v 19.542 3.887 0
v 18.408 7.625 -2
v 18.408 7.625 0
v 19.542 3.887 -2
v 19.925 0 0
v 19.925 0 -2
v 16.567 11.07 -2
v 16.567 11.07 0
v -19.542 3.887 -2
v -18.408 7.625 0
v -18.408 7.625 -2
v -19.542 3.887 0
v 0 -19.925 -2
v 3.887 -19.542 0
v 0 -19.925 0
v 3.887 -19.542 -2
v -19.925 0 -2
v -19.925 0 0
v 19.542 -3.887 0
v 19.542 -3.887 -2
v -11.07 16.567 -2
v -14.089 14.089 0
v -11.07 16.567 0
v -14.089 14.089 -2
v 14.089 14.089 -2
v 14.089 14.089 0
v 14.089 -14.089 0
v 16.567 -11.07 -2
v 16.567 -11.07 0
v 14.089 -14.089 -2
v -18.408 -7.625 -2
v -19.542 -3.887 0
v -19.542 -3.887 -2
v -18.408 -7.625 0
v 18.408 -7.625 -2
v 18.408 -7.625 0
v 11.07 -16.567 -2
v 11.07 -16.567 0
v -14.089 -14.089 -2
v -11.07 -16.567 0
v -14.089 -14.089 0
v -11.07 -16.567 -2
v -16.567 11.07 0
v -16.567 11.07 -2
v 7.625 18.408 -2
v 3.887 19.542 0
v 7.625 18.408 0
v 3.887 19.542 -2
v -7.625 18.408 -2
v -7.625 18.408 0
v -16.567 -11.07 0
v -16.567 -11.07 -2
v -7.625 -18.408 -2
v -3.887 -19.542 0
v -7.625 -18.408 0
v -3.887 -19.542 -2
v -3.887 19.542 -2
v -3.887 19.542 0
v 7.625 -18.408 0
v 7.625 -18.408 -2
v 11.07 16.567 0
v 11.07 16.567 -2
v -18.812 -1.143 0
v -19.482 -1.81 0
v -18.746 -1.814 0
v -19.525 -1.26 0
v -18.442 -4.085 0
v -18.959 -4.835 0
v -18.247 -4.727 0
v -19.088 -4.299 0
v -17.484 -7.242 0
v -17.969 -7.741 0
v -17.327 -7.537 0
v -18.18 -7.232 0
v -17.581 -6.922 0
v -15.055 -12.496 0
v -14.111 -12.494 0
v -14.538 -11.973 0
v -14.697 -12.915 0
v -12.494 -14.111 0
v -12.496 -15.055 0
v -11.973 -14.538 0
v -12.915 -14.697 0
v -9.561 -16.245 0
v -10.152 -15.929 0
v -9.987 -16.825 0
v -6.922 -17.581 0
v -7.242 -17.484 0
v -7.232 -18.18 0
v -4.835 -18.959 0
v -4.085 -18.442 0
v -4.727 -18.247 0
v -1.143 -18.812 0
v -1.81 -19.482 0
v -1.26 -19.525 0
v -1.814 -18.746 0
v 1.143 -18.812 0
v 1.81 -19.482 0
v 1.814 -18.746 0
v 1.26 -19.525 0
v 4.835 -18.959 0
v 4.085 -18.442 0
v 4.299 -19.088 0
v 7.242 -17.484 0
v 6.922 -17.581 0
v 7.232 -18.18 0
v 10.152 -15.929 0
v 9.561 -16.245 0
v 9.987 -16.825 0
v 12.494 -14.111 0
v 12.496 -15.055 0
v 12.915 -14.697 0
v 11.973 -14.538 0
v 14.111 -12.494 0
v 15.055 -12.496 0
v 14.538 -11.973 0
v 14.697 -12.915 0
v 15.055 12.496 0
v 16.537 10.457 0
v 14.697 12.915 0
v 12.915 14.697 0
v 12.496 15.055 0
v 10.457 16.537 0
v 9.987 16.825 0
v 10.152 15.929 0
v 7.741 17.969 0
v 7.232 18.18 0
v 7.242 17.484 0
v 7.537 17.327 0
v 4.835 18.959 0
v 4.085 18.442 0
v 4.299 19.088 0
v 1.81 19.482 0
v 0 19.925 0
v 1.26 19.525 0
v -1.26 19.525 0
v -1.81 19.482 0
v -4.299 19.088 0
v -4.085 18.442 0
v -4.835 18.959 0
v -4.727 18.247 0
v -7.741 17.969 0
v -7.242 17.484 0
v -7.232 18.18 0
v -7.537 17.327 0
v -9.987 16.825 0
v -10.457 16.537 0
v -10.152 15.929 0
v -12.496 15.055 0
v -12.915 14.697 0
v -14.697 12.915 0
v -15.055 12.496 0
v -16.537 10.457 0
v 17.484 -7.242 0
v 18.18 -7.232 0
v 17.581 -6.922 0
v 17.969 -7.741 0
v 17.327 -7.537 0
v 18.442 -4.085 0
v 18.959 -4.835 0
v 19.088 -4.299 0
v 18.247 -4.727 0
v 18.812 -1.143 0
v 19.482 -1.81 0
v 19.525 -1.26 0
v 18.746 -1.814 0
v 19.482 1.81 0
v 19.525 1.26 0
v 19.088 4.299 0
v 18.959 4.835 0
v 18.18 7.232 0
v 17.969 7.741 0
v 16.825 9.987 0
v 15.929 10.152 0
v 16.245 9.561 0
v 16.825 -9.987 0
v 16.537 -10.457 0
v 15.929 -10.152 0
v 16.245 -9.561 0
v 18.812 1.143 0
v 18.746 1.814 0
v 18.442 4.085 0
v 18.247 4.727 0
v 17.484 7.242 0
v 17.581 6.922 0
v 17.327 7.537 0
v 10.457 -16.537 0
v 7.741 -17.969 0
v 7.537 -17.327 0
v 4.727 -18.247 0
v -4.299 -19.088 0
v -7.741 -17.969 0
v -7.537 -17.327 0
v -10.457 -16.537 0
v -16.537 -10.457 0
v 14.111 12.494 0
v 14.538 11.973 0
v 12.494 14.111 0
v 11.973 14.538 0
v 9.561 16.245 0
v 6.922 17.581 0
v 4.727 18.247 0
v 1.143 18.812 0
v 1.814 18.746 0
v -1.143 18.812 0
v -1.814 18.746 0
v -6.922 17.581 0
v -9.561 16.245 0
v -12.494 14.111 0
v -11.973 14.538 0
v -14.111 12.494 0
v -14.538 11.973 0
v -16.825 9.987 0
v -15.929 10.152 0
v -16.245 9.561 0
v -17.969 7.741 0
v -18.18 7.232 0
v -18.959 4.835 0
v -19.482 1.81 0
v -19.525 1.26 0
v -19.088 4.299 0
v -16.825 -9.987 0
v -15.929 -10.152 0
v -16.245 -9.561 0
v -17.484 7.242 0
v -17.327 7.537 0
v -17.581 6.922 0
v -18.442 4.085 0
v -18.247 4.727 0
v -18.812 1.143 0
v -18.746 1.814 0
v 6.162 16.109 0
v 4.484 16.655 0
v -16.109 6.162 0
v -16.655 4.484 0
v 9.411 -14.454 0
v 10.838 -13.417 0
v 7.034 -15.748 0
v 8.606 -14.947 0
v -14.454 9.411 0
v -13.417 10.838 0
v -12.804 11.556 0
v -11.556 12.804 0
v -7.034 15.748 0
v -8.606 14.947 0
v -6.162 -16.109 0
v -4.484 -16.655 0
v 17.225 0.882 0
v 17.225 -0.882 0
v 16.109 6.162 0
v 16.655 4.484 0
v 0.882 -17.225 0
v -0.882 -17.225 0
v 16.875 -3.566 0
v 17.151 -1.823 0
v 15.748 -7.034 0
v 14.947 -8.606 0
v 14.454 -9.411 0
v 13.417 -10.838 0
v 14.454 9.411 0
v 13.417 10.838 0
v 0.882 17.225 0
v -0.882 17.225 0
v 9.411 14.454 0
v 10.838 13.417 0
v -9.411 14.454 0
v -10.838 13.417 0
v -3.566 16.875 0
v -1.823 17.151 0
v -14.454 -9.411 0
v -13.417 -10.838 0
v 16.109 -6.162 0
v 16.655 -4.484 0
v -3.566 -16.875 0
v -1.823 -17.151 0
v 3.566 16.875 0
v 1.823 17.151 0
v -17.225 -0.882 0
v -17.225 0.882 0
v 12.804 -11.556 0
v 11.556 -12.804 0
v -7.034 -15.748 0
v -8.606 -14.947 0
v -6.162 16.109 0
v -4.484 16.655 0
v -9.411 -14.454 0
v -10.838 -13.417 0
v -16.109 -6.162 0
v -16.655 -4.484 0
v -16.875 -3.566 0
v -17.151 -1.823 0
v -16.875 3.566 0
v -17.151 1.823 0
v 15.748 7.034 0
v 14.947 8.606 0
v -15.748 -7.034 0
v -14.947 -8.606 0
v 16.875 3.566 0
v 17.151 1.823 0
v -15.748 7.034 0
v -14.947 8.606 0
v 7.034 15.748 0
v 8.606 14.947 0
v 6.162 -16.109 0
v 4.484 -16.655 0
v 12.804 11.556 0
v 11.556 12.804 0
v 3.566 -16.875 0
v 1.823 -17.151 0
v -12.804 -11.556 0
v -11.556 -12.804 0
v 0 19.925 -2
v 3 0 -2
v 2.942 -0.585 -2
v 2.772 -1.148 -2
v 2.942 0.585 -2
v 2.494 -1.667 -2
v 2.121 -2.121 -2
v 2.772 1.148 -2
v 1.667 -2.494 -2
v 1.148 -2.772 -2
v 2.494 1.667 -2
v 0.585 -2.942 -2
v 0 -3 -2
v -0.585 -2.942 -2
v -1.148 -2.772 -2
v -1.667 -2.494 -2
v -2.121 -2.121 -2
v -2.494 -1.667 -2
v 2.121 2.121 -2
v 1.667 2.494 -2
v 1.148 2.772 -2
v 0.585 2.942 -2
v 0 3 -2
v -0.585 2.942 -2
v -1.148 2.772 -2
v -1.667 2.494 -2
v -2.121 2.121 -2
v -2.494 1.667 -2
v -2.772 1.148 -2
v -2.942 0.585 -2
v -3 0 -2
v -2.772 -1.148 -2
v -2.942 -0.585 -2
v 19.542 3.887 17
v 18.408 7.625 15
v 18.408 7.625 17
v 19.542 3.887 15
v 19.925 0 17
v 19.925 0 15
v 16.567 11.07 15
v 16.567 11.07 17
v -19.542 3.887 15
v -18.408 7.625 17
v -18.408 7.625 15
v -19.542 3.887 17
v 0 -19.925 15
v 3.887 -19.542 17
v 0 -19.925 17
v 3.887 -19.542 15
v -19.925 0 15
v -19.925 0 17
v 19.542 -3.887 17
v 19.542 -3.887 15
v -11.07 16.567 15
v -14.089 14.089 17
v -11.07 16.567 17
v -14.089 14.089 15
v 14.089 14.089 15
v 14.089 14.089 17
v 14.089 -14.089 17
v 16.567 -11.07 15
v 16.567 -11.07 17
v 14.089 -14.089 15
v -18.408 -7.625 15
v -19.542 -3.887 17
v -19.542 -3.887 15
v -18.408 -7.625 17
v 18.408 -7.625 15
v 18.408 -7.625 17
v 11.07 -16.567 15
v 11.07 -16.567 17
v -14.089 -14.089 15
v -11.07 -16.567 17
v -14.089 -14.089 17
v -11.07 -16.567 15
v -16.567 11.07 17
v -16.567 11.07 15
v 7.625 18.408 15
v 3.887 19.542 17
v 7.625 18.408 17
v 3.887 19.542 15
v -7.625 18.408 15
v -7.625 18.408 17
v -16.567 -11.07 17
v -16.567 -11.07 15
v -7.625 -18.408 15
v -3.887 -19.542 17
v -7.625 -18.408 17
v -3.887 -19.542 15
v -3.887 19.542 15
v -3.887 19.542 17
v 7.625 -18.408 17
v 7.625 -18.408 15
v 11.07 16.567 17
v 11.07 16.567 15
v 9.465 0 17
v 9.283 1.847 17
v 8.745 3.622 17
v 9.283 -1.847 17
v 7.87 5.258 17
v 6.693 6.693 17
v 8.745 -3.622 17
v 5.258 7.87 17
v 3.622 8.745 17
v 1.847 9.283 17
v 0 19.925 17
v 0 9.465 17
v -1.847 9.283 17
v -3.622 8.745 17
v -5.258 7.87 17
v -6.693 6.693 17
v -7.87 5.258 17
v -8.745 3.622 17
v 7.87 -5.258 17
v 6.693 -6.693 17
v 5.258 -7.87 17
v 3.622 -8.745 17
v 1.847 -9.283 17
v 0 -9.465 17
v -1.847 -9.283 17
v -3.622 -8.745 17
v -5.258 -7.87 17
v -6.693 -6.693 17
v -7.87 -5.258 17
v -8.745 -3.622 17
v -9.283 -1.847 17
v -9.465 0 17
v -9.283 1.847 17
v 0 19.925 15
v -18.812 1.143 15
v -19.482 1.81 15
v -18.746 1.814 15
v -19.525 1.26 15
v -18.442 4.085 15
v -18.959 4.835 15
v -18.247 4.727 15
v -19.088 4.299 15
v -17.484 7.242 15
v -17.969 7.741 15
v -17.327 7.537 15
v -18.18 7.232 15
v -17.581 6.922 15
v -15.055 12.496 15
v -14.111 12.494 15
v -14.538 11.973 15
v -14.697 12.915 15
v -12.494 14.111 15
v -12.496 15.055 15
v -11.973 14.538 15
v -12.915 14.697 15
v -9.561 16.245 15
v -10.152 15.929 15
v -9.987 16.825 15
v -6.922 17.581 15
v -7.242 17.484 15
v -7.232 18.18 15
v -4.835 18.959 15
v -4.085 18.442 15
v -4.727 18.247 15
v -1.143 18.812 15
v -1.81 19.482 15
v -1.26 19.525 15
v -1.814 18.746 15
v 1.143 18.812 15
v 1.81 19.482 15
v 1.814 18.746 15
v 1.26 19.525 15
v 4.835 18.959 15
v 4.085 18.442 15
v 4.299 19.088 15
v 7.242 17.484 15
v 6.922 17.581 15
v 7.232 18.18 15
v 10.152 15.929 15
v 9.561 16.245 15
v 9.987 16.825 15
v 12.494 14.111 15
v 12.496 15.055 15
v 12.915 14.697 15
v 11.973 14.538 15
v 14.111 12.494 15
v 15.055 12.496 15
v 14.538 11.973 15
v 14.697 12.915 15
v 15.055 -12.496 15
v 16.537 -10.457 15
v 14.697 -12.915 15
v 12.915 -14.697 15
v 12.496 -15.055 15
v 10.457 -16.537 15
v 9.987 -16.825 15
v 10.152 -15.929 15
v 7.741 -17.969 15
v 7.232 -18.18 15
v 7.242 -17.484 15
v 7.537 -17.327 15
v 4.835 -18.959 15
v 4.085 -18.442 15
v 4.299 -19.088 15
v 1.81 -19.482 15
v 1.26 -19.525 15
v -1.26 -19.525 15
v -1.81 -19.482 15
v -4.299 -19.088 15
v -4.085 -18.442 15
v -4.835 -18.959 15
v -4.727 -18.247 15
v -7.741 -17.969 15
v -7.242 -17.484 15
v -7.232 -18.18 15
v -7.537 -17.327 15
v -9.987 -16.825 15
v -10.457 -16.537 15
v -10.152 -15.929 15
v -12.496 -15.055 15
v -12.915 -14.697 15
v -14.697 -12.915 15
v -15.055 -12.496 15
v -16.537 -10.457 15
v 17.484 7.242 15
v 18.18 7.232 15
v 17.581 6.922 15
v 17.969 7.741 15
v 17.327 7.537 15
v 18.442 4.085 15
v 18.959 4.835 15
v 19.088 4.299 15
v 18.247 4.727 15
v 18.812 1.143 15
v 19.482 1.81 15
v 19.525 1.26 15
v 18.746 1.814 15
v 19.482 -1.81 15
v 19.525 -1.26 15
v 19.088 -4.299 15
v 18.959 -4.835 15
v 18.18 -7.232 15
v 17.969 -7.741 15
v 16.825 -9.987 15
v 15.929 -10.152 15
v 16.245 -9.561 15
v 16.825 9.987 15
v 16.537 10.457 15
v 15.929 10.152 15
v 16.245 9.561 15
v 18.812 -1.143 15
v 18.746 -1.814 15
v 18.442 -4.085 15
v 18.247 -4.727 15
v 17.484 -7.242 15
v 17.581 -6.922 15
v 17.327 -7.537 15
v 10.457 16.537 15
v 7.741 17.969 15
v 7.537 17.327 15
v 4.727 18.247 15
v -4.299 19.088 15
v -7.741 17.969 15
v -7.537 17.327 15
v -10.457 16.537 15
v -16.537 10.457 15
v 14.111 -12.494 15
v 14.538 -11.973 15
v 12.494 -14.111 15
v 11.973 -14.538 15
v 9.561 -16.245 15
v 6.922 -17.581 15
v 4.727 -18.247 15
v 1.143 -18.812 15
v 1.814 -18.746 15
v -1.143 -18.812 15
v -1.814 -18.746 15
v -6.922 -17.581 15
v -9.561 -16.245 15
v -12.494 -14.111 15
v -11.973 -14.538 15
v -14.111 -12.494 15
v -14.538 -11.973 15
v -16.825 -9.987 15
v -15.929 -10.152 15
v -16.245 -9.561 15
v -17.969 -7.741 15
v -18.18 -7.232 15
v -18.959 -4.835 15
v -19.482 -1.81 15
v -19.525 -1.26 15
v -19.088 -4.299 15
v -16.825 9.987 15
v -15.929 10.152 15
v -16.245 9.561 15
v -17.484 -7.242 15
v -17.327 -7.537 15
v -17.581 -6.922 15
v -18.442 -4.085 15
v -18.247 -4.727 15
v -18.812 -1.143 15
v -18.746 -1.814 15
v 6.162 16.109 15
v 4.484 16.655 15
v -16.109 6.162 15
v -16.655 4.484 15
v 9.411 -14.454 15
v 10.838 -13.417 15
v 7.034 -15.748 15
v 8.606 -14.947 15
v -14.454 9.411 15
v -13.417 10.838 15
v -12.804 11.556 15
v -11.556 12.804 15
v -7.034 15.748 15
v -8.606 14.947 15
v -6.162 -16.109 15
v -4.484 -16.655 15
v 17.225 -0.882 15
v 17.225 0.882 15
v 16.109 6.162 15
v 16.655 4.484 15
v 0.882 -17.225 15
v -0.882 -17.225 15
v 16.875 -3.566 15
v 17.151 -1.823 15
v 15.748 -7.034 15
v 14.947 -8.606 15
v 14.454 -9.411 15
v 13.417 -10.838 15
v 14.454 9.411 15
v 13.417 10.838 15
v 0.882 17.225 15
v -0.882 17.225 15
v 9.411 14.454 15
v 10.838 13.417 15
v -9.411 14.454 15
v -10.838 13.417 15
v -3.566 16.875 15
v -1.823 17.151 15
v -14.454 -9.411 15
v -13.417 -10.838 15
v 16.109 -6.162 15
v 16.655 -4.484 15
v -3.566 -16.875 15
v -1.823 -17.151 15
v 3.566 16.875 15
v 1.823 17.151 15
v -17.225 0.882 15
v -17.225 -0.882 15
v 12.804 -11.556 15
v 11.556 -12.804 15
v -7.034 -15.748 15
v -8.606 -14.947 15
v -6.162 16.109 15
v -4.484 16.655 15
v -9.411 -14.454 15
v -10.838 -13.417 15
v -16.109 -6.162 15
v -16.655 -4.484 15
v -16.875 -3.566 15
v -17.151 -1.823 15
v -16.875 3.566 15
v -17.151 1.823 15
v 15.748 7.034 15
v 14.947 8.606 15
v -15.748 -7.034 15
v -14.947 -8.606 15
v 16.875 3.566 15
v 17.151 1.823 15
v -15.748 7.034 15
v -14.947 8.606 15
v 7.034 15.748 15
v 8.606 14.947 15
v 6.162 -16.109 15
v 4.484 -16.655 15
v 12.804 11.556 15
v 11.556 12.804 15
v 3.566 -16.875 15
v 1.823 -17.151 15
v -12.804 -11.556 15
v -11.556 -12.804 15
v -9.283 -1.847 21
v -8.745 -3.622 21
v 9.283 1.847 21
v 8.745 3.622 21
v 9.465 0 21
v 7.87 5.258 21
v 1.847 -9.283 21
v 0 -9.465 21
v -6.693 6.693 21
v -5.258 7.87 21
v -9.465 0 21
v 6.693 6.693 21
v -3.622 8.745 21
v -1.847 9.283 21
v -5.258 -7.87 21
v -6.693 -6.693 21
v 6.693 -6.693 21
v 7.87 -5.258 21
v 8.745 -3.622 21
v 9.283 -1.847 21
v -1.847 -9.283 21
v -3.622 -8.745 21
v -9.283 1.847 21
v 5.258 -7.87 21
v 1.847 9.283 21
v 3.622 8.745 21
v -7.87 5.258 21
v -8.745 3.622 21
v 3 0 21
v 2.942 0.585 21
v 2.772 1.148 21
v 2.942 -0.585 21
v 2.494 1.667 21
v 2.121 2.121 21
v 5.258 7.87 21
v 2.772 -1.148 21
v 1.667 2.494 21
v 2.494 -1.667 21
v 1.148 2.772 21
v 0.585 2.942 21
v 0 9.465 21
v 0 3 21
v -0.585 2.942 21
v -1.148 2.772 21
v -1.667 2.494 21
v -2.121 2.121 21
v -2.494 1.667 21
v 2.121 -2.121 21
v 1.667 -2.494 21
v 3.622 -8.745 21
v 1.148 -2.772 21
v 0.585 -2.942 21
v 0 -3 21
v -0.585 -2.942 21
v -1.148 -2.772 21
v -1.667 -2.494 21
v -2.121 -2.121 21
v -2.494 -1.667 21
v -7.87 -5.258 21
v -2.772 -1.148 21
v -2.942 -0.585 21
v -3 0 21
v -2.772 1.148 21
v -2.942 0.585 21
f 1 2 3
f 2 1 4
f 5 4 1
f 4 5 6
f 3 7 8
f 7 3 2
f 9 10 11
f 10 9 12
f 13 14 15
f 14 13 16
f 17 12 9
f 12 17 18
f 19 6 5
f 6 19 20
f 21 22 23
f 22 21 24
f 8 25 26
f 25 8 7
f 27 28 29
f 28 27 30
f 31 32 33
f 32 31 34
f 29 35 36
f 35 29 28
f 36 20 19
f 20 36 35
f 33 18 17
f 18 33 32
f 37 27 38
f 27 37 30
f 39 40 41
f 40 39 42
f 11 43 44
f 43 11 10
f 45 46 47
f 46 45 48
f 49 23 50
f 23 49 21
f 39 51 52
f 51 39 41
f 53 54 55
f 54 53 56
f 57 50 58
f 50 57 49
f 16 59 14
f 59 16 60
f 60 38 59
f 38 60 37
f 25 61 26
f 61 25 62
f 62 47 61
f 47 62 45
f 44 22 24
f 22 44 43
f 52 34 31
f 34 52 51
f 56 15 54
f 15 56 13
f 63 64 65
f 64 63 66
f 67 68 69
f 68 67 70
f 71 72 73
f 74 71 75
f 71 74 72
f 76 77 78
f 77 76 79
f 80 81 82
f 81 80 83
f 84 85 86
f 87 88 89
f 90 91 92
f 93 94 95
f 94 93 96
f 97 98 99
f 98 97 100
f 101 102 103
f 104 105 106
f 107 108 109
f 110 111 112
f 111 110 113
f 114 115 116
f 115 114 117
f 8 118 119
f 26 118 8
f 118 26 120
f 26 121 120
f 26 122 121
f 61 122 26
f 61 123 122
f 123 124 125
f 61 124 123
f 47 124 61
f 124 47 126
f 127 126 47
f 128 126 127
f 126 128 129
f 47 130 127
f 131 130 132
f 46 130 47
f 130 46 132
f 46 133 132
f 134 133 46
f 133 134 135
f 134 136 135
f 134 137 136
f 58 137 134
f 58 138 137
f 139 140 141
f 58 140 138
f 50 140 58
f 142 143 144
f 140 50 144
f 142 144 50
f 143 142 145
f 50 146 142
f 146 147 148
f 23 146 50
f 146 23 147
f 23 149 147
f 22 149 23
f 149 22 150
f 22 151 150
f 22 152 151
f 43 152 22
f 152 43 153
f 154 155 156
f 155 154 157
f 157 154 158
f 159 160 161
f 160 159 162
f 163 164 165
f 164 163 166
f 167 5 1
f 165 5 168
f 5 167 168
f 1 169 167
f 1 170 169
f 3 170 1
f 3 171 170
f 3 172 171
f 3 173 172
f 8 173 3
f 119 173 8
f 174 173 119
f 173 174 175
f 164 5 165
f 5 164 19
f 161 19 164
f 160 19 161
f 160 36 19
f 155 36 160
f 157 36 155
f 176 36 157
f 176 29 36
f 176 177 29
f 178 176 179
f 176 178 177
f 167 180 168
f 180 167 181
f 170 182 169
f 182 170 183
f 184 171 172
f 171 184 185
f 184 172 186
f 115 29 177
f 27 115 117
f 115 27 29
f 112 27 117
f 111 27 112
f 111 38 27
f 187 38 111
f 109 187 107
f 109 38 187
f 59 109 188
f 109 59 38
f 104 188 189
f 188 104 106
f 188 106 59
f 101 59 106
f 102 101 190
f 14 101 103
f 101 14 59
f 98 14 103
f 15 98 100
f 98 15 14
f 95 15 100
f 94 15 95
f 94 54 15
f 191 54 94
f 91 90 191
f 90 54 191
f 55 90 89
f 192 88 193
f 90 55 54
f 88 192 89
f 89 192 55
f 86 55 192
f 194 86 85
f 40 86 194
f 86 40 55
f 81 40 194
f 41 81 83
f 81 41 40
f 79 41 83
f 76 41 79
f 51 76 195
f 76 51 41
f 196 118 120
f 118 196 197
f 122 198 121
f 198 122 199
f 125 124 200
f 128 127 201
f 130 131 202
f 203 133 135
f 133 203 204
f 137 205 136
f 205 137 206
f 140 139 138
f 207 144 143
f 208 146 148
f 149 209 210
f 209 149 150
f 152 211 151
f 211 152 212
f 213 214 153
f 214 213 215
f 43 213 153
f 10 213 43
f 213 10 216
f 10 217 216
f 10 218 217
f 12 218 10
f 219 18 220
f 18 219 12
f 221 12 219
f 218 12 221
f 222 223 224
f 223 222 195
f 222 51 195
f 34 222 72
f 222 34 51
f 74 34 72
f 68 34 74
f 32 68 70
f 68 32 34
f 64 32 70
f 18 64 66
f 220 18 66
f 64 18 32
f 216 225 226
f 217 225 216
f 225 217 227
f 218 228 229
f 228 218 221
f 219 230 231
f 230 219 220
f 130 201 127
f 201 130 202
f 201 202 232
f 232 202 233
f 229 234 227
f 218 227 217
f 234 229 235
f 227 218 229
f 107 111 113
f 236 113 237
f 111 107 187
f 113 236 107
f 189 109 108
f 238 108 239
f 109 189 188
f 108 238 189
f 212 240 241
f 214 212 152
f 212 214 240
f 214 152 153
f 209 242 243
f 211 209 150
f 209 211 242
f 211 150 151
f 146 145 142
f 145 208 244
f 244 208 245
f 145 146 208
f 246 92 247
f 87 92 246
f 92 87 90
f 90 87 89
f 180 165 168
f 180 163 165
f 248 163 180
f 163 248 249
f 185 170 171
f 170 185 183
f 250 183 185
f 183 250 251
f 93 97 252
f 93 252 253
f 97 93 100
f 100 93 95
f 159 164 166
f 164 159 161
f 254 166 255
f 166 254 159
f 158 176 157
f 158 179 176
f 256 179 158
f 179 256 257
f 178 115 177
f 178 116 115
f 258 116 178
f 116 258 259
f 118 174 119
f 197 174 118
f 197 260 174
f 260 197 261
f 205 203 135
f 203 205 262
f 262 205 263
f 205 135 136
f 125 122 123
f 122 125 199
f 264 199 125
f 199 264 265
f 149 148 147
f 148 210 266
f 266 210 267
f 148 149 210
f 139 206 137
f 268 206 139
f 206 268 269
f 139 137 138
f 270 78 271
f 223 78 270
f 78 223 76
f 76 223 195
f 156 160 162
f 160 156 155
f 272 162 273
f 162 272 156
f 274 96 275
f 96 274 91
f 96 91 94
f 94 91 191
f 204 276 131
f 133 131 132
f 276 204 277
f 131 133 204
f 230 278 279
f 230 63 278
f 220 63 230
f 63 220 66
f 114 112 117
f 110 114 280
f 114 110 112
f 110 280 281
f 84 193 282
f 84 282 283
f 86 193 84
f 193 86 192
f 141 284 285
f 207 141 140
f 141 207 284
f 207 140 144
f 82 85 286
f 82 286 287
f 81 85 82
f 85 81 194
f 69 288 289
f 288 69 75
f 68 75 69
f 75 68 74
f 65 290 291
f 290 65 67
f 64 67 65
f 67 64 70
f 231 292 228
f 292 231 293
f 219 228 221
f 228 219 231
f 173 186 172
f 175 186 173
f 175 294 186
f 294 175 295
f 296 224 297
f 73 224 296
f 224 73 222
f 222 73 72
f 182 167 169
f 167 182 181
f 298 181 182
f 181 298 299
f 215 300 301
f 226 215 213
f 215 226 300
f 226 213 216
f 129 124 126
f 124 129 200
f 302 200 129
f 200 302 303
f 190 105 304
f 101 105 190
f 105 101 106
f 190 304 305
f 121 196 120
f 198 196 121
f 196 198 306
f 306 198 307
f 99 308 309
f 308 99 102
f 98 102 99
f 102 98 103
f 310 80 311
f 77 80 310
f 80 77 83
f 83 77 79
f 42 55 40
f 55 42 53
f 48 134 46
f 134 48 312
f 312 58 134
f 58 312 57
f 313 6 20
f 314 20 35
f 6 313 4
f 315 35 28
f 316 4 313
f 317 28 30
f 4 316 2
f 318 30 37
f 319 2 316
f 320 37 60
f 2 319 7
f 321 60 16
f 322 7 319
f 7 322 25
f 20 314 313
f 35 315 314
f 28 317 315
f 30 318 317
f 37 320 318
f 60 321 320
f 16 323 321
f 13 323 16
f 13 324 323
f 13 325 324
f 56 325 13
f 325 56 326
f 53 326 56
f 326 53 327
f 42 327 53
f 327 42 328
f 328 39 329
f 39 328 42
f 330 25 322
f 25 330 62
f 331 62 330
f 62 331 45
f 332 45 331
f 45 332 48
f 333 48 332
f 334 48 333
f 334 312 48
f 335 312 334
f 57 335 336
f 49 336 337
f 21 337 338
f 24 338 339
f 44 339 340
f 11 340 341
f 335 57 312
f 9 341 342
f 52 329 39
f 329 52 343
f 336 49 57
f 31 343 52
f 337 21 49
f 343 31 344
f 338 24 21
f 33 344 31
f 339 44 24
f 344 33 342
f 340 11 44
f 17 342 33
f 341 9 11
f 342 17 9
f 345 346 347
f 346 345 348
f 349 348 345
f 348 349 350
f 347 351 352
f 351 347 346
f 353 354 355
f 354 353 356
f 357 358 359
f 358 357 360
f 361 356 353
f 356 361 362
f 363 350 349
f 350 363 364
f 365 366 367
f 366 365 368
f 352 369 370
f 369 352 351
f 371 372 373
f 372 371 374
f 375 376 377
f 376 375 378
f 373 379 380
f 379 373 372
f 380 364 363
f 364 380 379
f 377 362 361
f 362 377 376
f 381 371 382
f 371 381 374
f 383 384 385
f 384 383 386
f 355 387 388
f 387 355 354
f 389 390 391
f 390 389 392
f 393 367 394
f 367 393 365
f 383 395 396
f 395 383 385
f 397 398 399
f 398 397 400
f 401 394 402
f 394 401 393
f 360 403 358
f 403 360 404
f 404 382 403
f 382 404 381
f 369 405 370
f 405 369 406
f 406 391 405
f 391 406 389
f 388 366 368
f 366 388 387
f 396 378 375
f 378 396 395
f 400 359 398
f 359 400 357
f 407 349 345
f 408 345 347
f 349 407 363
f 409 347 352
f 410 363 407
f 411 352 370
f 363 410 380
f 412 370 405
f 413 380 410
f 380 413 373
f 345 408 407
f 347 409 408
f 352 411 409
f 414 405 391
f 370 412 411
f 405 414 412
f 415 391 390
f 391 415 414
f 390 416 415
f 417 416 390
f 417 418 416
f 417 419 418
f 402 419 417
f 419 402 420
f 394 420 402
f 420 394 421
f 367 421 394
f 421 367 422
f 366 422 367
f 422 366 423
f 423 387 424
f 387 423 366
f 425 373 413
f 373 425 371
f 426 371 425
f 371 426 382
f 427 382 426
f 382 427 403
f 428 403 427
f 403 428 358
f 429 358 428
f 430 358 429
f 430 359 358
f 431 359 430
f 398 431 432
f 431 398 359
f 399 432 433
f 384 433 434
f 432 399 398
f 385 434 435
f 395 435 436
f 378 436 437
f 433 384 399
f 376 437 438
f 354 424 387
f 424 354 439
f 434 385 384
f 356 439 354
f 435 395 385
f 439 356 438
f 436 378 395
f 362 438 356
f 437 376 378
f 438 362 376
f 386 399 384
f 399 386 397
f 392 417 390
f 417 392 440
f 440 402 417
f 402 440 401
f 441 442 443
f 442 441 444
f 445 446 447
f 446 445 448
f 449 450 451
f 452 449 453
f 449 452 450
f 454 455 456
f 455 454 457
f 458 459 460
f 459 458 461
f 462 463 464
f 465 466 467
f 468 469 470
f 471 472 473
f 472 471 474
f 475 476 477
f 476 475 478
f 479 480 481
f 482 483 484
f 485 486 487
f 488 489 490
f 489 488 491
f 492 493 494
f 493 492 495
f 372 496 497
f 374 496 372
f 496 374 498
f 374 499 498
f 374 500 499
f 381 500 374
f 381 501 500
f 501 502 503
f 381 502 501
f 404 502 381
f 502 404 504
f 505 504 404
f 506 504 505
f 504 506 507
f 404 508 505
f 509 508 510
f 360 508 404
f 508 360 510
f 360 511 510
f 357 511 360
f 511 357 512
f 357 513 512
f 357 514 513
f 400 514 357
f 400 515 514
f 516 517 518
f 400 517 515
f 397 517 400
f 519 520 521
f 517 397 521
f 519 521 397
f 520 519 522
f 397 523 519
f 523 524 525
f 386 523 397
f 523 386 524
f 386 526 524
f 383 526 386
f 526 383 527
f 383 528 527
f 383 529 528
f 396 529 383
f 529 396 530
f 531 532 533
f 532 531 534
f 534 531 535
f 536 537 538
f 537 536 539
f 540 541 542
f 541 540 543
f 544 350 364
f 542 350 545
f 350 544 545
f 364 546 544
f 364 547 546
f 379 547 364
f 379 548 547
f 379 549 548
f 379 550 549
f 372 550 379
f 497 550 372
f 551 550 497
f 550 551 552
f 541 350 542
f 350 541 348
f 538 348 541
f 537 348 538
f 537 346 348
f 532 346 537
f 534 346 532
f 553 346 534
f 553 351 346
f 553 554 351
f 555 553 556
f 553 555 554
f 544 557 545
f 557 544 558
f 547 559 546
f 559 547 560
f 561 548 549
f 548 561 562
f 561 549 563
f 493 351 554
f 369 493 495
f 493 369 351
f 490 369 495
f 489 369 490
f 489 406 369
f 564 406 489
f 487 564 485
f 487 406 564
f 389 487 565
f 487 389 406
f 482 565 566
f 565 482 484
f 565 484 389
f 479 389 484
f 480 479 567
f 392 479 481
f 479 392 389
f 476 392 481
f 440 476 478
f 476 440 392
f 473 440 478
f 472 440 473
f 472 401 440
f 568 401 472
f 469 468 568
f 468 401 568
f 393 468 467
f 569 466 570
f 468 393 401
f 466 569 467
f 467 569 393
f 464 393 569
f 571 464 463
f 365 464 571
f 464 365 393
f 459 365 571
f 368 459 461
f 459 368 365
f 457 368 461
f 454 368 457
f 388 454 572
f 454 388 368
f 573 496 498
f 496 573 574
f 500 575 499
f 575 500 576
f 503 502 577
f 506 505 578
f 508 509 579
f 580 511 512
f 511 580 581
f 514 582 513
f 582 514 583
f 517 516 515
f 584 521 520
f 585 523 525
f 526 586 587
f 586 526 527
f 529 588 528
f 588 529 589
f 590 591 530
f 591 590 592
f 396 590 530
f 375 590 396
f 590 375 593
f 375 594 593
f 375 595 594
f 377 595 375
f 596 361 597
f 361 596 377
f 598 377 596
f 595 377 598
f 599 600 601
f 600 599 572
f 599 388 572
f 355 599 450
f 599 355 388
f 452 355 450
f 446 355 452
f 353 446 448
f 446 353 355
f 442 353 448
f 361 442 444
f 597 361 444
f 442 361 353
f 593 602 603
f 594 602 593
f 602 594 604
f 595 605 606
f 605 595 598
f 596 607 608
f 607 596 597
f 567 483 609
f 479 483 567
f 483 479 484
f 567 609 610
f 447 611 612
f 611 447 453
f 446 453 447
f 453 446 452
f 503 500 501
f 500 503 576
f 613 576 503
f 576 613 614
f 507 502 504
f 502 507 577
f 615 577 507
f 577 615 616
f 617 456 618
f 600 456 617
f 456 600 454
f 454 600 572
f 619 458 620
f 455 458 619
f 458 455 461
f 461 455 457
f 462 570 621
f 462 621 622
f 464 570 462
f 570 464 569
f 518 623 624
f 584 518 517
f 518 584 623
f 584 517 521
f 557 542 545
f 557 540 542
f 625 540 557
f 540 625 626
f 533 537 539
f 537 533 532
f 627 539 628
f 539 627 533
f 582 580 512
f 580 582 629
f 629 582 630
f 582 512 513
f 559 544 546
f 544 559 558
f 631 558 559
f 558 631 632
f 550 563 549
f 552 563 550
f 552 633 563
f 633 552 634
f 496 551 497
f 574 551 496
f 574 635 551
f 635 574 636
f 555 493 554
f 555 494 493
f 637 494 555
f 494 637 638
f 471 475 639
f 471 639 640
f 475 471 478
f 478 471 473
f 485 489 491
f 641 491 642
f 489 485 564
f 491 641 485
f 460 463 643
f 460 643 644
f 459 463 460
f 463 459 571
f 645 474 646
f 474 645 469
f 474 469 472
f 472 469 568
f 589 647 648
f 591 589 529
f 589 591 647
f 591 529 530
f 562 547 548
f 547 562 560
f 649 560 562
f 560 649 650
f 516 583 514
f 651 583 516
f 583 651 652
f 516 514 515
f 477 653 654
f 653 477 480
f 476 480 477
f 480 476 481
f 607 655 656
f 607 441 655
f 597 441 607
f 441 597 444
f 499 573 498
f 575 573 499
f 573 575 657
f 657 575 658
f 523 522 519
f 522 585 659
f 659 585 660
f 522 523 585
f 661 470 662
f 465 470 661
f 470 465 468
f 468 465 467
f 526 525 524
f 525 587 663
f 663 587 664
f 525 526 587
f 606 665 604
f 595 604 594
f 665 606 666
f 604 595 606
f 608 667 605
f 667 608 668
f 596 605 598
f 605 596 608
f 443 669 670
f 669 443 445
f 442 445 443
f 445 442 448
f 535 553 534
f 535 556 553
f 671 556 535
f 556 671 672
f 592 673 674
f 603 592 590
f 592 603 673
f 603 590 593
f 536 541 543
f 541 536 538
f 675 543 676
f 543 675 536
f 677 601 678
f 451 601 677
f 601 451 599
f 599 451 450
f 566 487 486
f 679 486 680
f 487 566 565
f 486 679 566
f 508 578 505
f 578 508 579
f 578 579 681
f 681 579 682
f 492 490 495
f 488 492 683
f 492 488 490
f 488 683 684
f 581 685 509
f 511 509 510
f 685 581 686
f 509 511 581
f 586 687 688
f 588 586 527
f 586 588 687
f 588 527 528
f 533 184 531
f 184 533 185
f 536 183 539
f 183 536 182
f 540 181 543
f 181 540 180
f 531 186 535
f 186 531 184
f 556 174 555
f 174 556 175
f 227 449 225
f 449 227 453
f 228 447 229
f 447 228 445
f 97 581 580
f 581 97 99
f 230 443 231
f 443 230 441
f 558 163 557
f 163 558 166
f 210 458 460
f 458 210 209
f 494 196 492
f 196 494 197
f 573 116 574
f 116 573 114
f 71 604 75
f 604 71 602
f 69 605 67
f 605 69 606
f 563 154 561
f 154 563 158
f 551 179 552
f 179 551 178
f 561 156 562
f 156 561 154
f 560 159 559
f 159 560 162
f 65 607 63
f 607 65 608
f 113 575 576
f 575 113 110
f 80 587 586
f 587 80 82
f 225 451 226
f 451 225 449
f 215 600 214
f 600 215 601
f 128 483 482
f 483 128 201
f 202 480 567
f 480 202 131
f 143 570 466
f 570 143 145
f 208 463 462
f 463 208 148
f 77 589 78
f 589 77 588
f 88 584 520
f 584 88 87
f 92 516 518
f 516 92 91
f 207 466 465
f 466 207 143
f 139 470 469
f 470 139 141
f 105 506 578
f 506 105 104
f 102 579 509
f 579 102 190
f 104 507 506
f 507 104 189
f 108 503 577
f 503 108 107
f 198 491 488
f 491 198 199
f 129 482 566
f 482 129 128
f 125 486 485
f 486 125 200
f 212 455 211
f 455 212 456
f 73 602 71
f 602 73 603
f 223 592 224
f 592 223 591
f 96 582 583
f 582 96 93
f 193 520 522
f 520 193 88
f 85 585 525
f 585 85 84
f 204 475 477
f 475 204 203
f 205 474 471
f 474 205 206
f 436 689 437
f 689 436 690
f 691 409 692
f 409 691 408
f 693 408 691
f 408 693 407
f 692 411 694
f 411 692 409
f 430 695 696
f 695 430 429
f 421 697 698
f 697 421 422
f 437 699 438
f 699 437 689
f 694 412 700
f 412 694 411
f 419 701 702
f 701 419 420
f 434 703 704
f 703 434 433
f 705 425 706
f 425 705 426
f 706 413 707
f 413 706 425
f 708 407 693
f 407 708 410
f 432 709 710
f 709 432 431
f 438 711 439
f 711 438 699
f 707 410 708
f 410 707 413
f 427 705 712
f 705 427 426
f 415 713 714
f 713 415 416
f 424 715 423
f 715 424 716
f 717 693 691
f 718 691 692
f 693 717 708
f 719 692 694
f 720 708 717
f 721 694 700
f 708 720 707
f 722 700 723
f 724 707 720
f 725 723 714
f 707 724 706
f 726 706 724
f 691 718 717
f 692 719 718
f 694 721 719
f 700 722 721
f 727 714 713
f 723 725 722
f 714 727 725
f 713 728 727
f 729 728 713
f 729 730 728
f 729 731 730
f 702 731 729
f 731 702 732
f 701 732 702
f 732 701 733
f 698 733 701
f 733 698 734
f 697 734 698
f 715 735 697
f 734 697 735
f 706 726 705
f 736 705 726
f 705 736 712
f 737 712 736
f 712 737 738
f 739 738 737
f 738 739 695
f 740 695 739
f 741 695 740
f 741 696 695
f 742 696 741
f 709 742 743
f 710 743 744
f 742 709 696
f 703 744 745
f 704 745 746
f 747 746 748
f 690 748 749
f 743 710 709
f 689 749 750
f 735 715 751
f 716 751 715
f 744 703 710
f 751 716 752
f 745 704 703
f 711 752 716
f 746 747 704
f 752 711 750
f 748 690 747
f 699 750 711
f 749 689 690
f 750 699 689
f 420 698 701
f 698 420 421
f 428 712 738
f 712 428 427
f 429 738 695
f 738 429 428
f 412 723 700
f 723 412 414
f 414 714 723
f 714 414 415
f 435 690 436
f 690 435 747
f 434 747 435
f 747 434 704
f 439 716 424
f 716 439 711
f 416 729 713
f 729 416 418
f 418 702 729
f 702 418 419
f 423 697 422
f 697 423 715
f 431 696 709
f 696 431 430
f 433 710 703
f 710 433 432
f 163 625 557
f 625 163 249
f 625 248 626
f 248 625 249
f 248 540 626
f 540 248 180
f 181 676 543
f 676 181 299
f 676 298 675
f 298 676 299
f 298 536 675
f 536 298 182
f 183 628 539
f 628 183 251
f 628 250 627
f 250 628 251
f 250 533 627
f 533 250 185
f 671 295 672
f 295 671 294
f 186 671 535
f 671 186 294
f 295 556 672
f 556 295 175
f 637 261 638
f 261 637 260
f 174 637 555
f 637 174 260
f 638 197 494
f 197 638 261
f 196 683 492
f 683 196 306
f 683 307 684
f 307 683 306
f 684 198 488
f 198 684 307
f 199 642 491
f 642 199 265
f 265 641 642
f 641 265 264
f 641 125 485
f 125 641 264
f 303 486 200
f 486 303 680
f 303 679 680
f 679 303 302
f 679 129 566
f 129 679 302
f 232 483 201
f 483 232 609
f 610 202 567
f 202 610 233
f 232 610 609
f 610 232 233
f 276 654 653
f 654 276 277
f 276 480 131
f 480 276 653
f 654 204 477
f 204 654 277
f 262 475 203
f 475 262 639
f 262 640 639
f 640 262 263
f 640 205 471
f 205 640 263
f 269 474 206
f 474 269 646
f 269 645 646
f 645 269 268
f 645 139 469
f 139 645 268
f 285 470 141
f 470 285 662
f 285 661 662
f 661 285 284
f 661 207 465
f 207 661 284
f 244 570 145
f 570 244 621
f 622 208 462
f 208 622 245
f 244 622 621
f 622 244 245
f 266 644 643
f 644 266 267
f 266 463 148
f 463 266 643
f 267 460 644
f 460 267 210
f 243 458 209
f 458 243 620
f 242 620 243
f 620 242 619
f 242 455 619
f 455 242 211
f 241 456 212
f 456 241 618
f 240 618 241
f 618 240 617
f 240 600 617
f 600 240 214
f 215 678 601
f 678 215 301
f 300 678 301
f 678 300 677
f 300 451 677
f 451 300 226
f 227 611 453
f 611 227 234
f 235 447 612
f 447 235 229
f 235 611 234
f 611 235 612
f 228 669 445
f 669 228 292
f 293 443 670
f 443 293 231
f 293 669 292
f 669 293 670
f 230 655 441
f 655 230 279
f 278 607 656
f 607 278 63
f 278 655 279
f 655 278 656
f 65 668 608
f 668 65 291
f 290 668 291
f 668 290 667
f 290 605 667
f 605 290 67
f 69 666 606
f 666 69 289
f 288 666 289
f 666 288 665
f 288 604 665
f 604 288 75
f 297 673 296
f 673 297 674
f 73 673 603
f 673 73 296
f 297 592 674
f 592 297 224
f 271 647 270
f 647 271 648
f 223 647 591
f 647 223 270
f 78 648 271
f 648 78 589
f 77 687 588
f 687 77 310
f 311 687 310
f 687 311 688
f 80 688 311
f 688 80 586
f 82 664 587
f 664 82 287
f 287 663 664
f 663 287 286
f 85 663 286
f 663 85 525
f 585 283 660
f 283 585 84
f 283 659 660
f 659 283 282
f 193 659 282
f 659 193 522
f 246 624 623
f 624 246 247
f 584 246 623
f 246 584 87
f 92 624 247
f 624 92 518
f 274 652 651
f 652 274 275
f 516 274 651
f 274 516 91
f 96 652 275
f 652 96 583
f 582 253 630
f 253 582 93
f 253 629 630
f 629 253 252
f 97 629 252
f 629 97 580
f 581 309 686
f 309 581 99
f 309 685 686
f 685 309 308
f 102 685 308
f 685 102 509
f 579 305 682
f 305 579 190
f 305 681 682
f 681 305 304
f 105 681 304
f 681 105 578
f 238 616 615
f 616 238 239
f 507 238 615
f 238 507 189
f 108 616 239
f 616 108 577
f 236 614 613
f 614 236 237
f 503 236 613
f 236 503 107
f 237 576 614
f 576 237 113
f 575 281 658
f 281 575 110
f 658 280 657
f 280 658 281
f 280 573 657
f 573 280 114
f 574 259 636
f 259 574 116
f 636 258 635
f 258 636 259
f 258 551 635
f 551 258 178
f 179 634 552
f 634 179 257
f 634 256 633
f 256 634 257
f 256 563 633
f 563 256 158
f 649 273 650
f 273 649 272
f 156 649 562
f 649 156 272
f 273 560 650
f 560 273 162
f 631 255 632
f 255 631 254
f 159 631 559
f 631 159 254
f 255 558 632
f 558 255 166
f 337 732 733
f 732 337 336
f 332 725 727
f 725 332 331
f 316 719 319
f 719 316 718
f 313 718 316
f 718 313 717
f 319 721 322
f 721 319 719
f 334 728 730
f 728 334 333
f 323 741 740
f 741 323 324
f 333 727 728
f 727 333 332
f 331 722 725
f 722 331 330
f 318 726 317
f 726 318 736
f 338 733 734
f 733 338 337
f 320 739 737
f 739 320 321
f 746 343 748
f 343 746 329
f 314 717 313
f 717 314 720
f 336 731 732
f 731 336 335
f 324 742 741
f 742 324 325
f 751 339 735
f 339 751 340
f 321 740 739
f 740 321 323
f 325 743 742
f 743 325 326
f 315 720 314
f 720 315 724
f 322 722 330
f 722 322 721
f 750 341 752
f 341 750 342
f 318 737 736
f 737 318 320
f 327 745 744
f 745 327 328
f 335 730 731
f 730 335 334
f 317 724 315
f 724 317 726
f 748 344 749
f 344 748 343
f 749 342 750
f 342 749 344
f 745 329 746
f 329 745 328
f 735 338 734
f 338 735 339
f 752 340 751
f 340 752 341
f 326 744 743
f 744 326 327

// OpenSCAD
$fn = 32;

// ----------------------------------------------------------------------
// Timing pulley: GT3 40T, pitch 3 mm, 39.85 mm x 23 mm
// ----------------------------------------------------------------------

// --- parameters (mm) ---
pitch_mm = 3;             // belt pitch
tooth_count = 40;         // number of grooves
width = 15;               // belt width between the flanges
tip_d = 37.85;            // tip circle diameter
root_d = 35.65;           // groove bottom diameter
groove_h = 1.1;           // groove depth
tooth_w = 2.1;            // groove width at the tip circle
side_d = 39.85;           // flange diameter
side_t = 2;               // flange thickness
spigot_d = 34.05;         // flange spigot, sunk into the rim
spigot_h = 1.2;           // spigot depth into the rim
hub_bore = 6;             // shaft bore
hub_d = 18.93;            // hub diameter
hub_h = 4;                // hub above the flange
bottom_z = -2;            // lowest point of the pulley
top_z = 21;               // highest point of the pulley

module rim() {
  cylinder(h = width, d = tip_d);
}

module groove_cutter() {
  /* belt tooth groove: deeper than wide, cut through the belt width */
  translate([root_d / 2, 0, 0])
    linear_extrude(height = width)
      polygon(points = [[-0.6, -tooth_w * 0.42], [groove_h + 0.6, -tooth_w * 0.6],
                        [groove_h + 0.6, tooth_w * 0.6], [-0.6, tooth_w * 0.42]]);
}

module flanges() {
  translate([0, 0, -side_t]) cylinder(h = side_t, d = side_d);
  translate([0, 0, width]) cylinder(h = side_t, d = side_d);
  translate([0, 0, -spigot_h]) cylinder(h = spigot_h + 0.6, d = spigot_d);
  translate([0, 0, width - 0.6]) cylinder(h = spigot_h + 0.6, d = spigot_d);
}

module hub() {
  translate([0, 0, bottom_z]) cylinder(h = top_z - bottom_z, d = hub_d);
}

difference() {
  union() {
    rim();
    hub();
    flanges();
  }
  for (i = [0 : tooth_count - 1]) rotate([0, 0, i * 360 / tooth_count]) groove_cutter();
  translate([0, 0, bottom_z - 1]) cylinder(h = top_z - bottom_z + 2, d = hub_bore);
}
